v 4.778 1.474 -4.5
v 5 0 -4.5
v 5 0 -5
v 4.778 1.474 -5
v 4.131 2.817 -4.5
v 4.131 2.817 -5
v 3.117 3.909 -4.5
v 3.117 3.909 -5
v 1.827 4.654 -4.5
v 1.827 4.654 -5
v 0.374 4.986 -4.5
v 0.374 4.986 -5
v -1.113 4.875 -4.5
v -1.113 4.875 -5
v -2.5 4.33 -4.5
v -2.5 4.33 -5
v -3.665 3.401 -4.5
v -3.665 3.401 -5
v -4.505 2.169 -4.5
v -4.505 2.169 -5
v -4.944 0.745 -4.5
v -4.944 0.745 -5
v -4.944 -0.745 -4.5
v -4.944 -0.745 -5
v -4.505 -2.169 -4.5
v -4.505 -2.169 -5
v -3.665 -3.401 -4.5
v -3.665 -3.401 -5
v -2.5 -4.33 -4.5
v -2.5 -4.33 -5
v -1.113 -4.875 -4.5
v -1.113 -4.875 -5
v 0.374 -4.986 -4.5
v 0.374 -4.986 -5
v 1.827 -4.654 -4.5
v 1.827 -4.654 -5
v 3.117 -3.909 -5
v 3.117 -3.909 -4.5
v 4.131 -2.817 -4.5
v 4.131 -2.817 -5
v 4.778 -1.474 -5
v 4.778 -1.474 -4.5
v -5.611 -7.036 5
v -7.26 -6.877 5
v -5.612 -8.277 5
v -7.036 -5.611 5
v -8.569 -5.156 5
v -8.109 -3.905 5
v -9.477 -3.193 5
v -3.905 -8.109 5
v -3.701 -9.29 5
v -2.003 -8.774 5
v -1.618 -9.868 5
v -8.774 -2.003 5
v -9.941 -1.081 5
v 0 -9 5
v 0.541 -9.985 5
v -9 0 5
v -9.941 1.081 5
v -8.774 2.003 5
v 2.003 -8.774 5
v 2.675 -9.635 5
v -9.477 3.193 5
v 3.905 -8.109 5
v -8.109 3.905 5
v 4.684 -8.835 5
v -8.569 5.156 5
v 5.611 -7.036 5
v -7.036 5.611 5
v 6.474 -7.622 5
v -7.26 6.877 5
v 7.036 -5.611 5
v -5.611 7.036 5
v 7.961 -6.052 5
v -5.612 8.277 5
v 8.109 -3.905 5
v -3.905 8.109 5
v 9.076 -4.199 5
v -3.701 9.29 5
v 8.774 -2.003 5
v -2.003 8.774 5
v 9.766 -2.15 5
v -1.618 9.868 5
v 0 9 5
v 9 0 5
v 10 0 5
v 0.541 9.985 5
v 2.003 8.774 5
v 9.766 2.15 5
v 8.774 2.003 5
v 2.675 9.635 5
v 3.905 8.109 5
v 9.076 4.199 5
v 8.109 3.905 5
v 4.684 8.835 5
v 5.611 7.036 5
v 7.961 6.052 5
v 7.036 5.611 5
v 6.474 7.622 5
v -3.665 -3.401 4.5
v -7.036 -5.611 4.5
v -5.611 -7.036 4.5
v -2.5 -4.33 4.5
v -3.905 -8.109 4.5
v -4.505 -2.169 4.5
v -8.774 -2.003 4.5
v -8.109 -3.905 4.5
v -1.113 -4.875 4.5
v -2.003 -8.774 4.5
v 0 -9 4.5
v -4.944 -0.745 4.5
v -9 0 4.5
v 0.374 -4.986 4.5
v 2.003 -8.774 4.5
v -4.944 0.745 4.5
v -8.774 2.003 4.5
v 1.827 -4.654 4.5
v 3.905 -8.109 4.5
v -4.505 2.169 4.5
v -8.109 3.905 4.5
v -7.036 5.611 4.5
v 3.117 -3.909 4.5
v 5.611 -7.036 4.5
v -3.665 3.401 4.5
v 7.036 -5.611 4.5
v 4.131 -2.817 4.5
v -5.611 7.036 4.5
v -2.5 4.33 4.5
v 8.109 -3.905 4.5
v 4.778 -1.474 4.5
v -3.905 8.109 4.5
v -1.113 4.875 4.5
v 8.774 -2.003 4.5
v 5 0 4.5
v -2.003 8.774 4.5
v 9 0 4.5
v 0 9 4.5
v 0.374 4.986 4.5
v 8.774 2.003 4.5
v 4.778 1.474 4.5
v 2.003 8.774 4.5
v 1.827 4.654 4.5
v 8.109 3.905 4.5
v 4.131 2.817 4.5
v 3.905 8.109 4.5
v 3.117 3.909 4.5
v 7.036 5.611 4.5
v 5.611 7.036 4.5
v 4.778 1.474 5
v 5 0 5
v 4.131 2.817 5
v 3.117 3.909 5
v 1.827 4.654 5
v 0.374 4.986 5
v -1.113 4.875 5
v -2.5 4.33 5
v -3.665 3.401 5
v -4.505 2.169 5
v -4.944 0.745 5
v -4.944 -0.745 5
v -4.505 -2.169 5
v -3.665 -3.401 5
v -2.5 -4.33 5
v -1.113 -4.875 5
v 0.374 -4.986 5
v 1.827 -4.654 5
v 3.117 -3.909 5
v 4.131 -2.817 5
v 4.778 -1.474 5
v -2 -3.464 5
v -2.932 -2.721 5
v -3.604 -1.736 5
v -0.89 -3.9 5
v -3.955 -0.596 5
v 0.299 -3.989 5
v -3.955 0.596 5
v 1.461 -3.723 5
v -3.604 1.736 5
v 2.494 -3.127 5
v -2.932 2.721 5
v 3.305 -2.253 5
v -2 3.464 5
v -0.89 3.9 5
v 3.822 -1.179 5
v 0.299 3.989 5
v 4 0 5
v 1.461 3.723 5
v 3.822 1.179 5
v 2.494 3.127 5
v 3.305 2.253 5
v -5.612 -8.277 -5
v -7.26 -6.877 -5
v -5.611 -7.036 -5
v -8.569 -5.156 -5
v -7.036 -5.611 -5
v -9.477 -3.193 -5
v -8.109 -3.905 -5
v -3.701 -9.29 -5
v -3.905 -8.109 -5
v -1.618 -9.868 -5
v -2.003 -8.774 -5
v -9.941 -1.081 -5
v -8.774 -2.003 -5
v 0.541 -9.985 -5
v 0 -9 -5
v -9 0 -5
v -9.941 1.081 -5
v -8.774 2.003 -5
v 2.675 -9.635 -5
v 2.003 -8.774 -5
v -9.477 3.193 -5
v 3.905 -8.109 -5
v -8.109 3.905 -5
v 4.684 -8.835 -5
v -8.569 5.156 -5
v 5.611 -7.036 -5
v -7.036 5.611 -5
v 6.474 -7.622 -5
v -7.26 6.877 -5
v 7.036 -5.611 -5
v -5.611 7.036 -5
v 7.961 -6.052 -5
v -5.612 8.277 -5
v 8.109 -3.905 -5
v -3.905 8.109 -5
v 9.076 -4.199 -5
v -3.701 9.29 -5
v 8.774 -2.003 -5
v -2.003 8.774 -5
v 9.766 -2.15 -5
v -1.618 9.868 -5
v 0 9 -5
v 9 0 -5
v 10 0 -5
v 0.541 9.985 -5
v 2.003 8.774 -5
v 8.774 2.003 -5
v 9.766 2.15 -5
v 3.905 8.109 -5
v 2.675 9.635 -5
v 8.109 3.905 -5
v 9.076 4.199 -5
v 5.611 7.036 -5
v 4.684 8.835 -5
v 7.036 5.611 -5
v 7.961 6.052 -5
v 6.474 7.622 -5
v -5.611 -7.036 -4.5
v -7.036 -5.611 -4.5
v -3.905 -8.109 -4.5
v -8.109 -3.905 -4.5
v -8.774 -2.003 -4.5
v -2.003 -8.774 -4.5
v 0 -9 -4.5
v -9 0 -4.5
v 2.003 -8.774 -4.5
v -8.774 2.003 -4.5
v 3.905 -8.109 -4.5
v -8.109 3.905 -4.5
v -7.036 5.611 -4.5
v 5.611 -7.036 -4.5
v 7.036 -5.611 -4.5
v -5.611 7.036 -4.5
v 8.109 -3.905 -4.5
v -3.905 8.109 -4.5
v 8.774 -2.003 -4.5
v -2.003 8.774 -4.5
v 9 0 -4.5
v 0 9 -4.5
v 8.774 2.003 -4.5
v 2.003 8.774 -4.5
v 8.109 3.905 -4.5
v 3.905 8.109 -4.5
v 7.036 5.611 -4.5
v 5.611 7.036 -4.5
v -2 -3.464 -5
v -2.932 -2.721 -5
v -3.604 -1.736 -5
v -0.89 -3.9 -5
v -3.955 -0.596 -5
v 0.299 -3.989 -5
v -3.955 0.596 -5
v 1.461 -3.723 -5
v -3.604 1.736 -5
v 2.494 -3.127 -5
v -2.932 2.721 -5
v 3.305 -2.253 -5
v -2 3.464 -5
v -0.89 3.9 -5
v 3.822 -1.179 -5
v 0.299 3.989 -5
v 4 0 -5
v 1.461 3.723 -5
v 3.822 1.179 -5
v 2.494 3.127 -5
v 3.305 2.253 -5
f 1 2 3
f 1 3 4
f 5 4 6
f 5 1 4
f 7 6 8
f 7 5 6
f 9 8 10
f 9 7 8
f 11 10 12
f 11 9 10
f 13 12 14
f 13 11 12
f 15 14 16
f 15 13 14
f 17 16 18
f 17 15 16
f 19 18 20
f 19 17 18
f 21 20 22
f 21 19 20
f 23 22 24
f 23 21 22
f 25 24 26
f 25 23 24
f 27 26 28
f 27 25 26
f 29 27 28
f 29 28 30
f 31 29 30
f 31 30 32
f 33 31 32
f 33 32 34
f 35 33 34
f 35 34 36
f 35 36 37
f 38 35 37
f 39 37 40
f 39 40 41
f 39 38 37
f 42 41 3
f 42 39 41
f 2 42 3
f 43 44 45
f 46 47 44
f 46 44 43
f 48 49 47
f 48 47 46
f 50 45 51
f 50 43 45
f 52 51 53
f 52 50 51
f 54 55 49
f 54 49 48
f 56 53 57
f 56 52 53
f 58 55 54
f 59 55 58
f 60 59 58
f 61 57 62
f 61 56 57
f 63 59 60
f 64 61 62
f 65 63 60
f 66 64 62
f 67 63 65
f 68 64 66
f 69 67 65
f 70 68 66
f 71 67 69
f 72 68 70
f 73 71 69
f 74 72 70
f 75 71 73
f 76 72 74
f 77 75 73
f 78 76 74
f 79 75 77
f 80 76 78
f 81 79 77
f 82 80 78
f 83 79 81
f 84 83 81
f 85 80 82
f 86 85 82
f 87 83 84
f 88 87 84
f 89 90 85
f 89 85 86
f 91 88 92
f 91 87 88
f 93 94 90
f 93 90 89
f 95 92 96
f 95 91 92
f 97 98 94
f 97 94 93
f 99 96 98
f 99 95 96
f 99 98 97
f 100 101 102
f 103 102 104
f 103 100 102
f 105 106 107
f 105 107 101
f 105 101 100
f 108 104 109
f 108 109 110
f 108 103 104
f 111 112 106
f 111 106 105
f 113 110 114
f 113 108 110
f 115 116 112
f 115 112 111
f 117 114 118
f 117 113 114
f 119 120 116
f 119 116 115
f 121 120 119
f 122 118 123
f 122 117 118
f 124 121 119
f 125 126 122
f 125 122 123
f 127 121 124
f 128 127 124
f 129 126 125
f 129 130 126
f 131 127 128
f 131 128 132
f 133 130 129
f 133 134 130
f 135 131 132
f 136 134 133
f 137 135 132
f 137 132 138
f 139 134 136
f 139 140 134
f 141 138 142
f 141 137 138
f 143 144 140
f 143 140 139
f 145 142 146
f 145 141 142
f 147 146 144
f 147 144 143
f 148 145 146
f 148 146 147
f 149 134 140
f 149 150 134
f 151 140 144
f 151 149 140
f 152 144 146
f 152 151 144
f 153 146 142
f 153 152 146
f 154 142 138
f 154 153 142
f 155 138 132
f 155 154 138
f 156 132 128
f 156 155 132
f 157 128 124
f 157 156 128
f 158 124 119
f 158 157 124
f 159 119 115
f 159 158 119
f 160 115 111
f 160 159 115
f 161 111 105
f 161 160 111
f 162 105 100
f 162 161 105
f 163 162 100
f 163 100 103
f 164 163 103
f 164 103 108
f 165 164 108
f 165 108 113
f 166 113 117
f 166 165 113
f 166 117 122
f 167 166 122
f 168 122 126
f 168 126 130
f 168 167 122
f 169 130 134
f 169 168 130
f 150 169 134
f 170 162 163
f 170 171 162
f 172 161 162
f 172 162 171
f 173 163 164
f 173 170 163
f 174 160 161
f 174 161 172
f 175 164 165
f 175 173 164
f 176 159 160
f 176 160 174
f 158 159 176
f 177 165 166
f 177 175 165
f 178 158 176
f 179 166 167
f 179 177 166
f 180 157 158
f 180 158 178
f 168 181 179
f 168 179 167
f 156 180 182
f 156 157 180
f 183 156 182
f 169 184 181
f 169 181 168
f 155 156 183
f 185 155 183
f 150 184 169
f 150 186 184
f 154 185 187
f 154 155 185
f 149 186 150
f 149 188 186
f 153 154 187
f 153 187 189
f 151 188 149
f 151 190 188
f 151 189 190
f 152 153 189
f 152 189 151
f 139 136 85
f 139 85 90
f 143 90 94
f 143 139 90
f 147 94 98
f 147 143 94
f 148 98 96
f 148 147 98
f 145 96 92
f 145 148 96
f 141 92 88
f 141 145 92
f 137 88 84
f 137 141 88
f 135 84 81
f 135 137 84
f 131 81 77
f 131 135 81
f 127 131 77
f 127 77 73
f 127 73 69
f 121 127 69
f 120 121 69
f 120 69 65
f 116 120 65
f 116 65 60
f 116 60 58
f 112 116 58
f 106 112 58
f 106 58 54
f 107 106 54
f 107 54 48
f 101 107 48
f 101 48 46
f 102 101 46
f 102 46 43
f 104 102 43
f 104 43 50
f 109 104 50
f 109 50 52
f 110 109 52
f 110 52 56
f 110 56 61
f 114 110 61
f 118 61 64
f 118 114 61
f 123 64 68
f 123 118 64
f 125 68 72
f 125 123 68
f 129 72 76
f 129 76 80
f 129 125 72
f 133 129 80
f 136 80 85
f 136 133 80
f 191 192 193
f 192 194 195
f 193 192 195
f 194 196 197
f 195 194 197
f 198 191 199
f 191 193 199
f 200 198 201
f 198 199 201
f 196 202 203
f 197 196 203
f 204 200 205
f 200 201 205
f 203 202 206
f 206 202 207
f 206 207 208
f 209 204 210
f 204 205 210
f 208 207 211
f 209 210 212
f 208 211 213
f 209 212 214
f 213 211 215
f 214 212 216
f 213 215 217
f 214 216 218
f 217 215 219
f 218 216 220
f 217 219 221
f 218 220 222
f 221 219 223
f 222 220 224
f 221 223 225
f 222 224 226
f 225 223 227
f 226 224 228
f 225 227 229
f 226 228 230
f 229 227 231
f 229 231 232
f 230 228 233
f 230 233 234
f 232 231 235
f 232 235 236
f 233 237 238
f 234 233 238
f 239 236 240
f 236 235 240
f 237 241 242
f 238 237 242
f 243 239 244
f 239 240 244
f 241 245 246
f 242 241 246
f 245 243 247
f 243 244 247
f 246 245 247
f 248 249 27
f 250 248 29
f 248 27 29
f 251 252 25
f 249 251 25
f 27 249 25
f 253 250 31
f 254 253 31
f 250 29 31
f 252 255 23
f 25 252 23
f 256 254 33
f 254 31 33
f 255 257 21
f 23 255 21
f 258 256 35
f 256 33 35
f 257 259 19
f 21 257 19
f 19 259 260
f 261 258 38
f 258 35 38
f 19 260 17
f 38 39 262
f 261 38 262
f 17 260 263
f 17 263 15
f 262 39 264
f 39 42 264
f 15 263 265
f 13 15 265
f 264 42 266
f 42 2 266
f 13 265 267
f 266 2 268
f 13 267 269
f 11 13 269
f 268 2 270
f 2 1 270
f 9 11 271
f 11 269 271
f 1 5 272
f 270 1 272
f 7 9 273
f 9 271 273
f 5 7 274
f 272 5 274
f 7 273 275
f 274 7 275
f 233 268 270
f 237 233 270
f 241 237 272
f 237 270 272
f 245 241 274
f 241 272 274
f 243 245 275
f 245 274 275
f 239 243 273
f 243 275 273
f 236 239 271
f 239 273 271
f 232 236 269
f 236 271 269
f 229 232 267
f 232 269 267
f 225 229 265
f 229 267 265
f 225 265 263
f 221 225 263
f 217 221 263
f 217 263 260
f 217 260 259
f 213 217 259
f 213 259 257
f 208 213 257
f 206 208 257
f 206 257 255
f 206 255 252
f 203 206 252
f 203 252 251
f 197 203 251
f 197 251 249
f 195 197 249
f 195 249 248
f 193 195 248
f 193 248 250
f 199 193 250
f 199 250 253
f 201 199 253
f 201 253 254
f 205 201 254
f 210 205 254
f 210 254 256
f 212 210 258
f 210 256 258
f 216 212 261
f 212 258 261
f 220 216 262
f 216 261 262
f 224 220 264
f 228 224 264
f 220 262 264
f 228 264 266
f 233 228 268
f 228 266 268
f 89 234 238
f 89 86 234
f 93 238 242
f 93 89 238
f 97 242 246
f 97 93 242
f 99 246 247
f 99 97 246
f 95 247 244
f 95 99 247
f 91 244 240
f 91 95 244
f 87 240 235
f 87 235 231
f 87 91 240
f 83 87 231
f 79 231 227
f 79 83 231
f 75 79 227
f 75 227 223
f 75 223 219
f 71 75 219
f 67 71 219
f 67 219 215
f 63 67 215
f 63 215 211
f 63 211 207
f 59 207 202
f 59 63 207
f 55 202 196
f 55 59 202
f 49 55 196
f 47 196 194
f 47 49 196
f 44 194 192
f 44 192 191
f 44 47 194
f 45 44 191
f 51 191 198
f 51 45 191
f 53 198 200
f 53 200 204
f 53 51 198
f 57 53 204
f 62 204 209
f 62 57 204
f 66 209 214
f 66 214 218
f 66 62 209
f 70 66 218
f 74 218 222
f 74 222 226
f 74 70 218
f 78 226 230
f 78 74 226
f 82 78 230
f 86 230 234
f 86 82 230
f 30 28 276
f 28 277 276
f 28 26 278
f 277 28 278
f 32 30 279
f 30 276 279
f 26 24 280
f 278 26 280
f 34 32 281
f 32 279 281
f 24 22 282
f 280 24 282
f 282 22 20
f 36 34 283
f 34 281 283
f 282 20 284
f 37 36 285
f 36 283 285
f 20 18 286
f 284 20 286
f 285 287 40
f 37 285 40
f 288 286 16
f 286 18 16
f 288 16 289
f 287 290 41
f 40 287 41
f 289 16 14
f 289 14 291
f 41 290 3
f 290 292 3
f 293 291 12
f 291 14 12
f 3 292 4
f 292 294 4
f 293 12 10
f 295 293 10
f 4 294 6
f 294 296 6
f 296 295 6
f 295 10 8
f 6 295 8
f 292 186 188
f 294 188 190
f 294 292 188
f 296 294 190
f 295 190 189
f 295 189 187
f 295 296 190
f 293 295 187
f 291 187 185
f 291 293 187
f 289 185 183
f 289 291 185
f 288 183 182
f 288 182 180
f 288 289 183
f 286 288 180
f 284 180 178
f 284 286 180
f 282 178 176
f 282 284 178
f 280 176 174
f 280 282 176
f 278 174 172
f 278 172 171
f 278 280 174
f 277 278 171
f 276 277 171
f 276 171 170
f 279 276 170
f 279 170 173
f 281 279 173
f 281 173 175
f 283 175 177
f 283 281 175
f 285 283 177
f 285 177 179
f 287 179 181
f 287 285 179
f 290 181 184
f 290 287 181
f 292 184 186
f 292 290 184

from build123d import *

# Parameters (mm, degrees)
SKETCH_1_R      = 9
SKETCH_1_R_2    = 5
EXTRUDE_1_DEPTH = 4.5
SKETCH_1_3_R    = 10
SKETCH_1_3_R_2  = 9
SKETCH_1_3_R_3  = 5
SKETCH_1_3_R_4  = 4
EXTRUDE_2_DEPTH = 5


with BuildPart() as part:
    # 草图1 → 凸台-拉伸1 (new, symmetric)
    with BuildSketch(Plane.XY):
        Circle(SKETCH_1_R)
        Circle(SKETCH_1_R_2, mode=Mode.SUBTRACT)
    extrude(amount=EXTRUDE_1_DEPTH, both=True)

    # 草图1<3> → 凸台-拉伸2 (add, symmetric)
    # profile 1 of 2: a face of its own
    with BuildSketch(Plane.XY):
        Circle(SKETCH_1_3_R)
        Circle(SKETCH_1_3_R_2, mode=Mode.SUBTRACT)
    # profile 2 of 2: a face of its own
    with BuildSketch(Plane.XY):
        Circle(SKETCH_1_3_R_3)
        Circle(SKETCH_1_3_R_4, mode=Mode.SUBTRACT)
    extrude(amount=EXTRUDE_2_DEPTH, both=True)


solid = part.part
